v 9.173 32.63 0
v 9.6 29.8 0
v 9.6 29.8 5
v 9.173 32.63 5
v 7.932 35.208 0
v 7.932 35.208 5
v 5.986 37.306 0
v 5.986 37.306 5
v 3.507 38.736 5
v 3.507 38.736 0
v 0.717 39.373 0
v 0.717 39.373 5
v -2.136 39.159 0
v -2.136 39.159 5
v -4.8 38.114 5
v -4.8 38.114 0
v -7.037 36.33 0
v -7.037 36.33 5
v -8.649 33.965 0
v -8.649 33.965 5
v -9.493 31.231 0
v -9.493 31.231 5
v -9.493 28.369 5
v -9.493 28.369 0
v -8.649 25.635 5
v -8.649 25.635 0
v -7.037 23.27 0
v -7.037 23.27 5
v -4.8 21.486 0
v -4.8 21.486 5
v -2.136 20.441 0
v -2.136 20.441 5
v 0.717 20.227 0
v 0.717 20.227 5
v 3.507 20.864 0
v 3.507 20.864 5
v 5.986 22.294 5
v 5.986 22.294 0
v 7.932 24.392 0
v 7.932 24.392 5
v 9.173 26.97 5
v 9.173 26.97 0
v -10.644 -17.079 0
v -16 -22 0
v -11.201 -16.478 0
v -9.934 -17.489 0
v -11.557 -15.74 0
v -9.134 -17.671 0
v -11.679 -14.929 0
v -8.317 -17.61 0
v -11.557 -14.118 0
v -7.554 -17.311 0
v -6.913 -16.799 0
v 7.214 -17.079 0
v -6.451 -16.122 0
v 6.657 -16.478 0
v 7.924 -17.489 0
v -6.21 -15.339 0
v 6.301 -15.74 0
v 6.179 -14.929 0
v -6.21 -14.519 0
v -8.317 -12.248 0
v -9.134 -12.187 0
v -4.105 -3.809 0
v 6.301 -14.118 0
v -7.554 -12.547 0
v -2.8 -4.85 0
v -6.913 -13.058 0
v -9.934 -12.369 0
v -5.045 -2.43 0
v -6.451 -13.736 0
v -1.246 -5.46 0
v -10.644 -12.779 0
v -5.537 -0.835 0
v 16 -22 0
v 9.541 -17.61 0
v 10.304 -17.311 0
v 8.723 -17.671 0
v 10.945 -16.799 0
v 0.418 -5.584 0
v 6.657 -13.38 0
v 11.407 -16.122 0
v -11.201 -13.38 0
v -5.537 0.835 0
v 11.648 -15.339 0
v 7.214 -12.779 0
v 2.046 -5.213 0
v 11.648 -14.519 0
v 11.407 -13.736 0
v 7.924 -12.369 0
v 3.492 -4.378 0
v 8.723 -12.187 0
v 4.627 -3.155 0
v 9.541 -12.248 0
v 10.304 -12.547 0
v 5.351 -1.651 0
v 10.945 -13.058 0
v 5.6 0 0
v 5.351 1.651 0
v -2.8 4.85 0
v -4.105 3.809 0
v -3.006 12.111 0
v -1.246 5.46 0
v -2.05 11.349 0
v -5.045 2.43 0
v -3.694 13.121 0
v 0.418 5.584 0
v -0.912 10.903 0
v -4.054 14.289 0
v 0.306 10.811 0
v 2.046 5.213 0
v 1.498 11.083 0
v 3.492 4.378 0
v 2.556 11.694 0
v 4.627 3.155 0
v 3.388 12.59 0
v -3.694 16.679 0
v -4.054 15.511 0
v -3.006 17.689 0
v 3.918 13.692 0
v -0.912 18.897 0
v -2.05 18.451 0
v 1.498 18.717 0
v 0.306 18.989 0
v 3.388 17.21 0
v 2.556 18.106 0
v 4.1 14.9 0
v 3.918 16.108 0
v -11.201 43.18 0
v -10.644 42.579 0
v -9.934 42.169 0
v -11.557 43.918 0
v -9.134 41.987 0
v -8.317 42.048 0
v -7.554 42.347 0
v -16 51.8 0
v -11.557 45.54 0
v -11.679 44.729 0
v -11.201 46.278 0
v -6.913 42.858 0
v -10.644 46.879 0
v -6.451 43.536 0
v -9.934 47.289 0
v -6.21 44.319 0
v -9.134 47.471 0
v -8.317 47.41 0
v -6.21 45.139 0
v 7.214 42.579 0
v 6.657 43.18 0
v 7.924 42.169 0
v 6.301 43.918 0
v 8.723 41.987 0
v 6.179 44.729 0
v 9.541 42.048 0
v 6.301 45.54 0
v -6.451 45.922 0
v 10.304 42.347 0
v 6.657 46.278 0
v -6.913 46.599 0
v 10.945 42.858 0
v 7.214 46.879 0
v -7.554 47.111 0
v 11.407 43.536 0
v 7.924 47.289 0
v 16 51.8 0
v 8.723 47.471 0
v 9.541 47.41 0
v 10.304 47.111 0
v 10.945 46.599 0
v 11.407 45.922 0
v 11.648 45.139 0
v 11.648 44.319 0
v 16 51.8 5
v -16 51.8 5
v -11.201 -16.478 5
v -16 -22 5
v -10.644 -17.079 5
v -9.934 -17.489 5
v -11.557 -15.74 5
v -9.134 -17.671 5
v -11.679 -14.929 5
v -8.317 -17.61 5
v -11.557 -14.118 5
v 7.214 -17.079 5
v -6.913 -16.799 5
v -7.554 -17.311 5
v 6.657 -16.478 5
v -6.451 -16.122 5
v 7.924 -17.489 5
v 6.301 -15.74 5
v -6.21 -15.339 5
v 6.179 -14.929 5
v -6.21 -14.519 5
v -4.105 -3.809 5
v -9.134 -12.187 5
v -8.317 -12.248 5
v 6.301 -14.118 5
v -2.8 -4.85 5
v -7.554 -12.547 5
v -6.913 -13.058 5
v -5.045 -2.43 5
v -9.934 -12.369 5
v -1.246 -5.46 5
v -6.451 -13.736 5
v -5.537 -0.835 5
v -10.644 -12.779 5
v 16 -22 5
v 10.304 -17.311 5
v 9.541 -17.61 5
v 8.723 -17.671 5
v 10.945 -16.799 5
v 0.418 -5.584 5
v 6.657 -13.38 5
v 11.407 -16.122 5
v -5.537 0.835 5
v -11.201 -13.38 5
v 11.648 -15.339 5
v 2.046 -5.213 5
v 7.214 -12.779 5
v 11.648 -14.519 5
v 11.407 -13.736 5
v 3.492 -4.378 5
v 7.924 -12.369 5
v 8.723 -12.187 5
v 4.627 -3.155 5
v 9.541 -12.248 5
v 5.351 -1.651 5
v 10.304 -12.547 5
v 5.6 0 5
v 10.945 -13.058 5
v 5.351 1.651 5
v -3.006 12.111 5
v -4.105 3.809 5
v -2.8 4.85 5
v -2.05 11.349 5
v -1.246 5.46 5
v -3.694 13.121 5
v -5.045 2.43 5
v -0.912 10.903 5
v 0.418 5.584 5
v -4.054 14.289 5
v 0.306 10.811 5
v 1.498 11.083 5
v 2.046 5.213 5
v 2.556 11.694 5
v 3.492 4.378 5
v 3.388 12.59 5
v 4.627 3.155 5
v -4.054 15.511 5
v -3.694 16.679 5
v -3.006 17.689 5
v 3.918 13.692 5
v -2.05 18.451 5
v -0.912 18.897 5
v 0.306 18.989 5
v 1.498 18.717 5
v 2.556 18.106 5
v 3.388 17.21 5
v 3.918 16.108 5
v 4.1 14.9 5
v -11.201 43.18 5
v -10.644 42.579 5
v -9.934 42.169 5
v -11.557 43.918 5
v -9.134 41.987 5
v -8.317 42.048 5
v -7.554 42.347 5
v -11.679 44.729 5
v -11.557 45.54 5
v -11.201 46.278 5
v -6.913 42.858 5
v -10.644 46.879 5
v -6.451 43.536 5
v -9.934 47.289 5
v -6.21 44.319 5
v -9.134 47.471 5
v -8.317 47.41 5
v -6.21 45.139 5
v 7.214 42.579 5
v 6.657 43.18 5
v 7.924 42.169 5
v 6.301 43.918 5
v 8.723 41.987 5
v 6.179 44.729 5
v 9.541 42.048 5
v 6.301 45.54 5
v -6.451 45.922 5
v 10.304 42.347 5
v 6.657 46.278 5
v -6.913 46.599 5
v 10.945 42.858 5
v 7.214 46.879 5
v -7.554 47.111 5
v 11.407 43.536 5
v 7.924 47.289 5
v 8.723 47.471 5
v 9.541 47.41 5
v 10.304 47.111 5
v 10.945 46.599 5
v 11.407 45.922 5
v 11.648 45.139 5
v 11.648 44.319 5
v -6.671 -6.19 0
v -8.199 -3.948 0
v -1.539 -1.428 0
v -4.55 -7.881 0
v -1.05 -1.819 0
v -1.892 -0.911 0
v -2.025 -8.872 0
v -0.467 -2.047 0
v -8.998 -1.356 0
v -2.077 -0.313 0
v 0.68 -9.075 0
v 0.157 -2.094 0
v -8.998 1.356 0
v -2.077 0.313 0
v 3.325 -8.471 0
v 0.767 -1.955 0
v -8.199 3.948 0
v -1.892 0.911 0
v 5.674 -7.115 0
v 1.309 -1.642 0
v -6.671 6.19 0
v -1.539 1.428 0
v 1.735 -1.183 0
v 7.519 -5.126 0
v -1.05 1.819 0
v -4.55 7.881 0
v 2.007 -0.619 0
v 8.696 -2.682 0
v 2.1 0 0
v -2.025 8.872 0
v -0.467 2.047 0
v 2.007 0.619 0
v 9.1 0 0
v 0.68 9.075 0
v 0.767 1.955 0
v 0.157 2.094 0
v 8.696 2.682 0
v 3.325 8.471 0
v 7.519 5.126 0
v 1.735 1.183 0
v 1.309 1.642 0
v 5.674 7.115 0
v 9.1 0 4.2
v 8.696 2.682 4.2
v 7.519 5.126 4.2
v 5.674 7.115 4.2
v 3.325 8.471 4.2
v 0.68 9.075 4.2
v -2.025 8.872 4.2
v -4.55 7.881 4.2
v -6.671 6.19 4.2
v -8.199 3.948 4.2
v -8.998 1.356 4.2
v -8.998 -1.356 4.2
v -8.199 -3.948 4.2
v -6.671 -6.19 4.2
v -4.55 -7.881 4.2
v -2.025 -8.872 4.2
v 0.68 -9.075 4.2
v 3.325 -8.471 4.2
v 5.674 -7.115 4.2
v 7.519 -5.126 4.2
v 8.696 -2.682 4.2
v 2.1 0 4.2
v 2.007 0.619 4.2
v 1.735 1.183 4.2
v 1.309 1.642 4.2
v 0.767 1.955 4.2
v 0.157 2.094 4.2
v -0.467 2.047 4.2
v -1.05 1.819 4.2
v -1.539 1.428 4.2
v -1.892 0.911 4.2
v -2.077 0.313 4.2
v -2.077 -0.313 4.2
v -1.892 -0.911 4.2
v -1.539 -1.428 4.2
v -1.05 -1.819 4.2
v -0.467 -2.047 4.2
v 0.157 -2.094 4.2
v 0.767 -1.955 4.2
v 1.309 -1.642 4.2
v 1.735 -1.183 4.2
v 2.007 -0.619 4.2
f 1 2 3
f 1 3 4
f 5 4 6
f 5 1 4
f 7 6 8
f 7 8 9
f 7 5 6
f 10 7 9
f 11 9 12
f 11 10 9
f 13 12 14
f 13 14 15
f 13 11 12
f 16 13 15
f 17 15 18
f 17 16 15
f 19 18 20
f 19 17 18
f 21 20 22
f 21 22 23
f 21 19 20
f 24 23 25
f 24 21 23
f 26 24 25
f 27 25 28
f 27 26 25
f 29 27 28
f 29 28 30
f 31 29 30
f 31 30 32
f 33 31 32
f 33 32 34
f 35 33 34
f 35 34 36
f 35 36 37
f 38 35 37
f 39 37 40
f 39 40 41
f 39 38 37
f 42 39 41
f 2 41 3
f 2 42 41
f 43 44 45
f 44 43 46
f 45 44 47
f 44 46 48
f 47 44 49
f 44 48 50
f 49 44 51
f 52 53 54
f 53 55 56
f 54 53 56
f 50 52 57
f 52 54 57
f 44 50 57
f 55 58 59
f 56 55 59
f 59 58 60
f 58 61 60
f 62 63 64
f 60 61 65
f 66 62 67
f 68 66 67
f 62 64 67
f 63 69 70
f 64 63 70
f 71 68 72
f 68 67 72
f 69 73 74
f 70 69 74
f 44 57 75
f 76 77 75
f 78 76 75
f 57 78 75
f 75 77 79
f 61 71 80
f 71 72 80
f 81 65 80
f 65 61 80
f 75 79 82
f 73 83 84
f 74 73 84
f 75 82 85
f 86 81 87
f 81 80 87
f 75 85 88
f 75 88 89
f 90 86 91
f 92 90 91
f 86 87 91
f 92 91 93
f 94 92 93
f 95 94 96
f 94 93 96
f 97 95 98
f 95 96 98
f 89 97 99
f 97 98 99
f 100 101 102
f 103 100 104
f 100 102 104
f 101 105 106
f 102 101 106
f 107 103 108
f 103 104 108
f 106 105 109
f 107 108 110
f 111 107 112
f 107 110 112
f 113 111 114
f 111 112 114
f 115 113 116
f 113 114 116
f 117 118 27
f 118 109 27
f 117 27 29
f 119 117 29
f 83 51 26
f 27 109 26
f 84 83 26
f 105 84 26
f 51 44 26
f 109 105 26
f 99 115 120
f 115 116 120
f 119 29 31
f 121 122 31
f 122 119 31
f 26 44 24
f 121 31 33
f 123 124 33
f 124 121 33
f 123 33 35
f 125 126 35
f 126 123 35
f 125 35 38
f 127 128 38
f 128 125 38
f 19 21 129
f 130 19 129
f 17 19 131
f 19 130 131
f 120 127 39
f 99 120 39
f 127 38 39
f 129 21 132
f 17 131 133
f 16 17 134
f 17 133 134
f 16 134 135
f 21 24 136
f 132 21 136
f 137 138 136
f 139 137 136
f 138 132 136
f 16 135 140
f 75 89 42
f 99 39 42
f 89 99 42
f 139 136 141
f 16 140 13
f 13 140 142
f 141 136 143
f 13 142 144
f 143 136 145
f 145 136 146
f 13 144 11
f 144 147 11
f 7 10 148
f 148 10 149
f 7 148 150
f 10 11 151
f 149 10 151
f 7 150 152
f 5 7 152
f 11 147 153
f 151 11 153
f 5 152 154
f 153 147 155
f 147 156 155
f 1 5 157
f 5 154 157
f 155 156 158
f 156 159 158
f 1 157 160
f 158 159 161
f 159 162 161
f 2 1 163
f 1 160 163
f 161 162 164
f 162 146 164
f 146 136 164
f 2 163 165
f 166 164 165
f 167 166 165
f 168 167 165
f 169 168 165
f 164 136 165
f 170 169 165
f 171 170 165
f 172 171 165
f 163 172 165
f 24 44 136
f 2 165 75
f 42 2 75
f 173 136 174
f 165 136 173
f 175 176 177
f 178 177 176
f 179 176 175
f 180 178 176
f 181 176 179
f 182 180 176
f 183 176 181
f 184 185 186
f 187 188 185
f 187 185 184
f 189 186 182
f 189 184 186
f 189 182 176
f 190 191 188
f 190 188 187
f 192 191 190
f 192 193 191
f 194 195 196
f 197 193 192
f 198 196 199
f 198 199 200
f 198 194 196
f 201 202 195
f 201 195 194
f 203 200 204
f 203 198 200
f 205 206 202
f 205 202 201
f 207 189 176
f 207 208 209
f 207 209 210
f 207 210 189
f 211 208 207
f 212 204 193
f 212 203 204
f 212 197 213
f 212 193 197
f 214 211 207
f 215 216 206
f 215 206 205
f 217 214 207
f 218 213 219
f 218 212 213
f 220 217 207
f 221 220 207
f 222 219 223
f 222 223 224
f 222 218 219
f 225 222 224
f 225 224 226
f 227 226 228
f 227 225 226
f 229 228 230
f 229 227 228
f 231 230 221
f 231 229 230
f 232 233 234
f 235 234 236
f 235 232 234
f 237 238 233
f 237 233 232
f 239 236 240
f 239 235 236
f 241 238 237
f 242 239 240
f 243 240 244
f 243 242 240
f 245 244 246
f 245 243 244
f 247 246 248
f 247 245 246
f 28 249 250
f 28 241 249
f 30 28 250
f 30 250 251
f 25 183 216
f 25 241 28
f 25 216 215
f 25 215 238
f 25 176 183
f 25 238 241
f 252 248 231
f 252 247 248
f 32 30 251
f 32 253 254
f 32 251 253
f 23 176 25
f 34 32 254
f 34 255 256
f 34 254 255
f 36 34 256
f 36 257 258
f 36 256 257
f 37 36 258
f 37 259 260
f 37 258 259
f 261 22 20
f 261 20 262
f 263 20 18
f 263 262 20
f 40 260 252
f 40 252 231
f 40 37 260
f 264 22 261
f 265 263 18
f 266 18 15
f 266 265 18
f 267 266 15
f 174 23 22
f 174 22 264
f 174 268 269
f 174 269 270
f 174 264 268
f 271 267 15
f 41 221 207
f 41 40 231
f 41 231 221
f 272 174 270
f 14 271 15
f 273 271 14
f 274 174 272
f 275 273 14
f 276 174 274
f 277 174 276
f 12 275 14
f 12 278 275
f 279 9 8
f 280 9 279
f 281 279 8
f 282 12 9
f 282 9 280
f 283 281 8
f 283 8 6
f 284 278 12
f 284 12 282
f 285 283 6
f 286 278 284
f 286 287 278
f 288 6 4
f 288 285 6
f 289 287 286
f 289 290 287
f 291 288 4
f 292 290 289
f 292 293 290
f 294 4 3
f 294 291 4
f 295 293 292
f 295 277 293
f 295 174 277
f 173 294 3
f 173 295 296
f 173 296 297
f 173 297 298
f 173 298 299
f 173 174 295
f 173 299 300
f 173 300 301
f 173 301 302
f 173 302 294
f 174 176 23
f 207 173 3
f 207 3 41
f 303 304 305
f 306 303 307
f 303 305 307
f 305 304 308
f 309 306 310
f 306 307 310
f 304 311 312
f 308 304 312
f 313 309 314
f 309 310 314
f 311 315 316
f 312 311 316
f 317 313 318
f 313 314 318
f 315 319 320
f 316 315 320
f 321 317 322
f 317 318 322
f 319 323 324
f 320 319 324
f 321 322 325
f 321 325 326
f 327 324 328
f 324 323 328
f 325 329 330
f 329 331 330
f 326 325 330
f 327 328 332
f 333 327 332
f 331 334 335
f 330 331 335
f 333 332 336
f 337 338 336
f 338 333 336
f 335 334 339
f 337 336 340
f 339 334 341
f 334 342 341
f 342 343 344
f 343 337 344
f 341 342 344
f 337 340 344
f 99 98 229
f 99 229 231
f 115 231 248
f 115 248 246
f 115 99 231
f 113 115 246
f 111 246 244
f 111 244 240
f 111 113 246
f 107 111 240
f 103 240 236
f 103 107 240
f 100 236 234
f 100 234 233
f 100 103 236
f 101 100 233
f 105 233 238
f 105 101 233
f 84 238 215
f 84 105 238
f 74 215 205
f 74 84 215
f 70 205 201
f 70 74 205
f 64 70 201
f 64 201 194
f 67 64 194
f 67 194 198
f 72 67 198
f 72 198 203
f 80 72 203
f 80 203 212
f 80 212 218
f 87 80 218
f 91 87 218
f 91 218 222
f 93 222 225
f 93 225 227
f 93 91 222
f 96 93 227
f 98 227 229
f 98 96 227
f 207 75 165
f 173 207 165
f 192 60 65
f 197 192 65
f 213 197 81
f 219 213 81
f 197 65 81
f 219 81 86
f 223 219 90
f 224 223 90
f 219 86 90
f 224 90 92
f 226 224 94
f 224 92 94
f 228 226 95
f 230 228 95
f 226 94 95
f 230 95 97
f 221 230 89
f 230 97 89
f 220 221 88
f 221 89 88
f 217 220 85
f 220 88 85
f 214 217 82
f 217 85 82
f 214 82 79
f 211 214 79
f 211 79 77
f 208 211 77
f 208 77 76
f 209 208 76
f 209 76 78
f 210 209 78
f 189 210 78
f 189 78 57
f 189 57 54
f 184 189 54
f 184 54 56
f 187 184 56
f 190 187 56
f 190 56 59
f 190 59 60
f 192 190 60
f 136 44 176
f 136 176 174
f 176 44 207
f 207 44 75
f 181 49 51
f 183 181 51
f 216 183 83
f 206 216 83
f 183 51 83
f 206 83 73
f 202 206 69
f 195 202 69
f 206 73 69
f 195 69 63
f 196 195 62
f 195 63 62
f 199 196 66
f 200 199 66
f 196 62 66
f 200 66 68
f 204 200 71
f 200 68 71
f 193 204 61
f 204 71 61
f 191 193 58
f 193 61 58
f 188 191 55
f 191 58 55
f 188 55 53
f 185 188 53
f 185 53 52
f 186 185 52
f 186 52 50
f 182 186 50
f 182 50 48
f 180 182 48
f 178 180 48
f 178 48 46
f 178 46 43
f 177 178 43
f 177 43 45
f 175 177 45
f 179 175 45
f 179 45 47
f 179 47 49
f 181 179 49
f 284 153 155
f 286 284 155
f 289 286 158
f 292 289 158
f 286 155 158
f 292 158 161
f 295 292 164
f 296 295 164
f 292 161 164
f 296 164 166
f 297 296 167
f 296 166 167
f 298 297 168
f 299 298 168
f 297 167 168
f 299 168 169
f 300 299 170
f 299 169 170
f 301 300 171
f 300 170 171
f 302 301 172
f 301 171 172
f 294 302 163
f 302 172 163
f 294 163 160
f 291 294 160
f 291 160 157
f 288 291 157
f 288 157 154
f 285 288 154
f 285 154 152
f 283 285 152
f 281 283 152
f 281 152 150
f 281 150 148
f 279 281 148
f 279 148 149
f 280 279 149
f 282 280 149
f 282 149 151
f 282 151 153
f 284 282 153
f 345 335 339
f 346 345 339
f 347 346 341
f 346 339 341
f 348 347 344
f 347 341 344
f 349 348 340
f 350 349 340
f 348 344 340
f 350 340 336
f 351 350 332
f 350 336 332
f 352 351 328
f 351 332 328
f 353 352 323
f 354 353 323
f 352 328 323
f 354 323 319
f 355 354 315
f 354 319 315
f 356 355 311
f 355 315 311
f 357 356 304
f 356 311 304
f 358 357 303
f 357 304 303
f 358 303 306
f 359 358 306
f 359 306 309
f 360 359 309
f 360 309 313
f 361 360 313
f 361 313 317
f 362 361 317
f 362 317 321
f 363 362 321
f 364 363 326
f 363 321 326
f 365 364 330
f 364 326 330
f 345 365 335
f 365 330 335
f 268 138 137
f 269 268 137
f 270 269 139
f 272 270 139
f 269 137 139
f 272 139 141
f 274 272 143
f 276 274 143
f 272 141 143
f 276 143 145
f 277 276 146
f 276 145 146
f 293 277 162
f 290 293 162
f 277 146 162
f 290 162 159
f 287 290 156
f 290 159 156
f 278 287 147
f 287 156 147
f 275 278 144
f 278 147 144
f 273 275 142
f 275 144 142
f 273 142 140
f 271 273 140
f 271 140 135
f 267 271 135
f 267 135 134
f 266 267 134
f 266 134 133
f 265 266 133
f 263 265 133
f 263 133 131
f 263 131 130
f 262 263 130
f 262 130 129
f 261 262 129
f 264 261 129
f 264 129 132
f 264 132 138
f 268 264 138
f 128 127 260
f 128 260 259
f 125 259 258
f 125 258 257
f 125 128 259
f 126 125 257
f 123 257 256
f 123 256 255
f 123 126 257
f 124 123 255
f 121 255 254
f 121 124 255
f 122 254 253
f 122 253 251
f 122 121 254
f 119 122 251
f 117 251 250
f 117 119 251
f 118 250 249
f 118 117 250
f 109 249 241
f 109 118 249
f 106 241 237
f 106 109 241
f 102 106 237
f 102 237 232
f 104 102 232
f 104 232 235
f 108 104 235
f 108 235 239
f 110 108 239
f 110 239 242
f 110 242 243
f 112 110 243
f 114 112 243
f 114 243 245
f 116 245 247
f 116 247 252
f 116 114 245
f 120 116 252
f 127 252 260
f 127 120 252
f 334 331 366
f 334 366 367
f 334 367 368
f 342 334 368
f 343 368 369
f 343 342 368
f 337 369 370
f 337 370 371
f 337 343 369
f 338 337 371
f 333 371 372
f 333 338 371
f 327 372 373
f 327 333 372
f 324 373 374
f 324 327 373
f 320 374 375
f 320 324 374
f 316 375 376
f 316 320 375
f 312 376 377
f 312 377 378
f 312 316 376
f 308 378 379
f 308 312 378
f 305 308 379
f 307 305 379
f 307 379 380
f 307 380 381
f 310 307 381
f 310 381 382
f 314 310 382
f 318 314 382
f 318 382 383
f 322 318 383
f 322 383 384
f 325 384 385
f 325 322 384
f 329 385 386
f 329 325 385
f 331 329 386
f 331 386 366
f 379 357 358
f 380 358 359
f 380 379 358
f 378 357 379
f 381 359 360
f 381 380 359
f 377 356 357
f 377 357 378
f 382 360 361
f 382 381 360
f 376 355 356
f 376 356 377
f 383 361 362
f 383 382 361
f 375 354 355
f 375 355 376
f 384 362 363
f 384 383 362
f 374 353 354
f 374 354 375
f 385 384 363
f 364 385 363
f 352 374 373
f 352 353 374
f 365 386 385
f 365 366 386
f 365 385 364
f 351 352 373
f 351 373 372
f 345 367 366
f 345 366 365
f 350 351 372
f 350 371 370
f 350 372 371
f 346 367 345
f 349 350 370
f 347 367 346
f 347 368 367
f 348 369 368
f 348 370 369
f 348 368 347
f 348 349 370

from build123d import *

# Parameters (mm, degrees)
F1_W     = 32
F1_H     = 73.8
F1_R     = 5.6
F1_R_2   = 4.1
F1_R_3   = 9.6
F2_DEPTH = 5
F4_D     = 5.5
F4_DEPTH = 14.4
F4_TIP   = 1.6523667023
F5_R     = 9.1
F5_R_2   = 2.1
F6_DEPTH = 4.2


with BuildPart() as f2:
    # F1 (on Top) → F2 (new body)
    with BuildSketch(Plane.XY):
        with Locations((0, 14.9)):
            Rectangle(F1_W, F1_H)
        Circle(F1_R, mode=Mode.SUBTRACT)
        with Locations((0, 14.9)):
            Circle(F1_R_2, mode=Mode.SUBTRACT)
        with Locations((0, 29.8)):
            Circle(F1_R_3, mode=Mode.SUBTRACT)
    extrude(amount=F2_DEPTH)

    # F4
    with Locations(Plane.XY.offset(5)):
        with Locations((-8.9289321881, 44.7289321881), (8.9289321881, 44.7289321881), (8.9289321881, -14.9289321881), (-8.9289321881, -14.9289321881)):
            Hole(F4_D / 2, depth=F4_DEPTH)
            with Locations((0, 0, -(F4_DEPTH + F4_TIP / 2))):  # 118° drill point
                Cone(0, F4_D / 2, F4_TIP, mode=Mode.SUBTRACT)


with BuildPart() as f6:
    # F5 (on Top) → F6 (new body)
    with BuildSketch(Plane.XY):
        Circle(F5_R)
        Circle(F5_R_2, mode=Mode.SUBTRACT)
    extrude(amount=F6_DEPTH)


solid = Compound([f2.part, f6.part])
